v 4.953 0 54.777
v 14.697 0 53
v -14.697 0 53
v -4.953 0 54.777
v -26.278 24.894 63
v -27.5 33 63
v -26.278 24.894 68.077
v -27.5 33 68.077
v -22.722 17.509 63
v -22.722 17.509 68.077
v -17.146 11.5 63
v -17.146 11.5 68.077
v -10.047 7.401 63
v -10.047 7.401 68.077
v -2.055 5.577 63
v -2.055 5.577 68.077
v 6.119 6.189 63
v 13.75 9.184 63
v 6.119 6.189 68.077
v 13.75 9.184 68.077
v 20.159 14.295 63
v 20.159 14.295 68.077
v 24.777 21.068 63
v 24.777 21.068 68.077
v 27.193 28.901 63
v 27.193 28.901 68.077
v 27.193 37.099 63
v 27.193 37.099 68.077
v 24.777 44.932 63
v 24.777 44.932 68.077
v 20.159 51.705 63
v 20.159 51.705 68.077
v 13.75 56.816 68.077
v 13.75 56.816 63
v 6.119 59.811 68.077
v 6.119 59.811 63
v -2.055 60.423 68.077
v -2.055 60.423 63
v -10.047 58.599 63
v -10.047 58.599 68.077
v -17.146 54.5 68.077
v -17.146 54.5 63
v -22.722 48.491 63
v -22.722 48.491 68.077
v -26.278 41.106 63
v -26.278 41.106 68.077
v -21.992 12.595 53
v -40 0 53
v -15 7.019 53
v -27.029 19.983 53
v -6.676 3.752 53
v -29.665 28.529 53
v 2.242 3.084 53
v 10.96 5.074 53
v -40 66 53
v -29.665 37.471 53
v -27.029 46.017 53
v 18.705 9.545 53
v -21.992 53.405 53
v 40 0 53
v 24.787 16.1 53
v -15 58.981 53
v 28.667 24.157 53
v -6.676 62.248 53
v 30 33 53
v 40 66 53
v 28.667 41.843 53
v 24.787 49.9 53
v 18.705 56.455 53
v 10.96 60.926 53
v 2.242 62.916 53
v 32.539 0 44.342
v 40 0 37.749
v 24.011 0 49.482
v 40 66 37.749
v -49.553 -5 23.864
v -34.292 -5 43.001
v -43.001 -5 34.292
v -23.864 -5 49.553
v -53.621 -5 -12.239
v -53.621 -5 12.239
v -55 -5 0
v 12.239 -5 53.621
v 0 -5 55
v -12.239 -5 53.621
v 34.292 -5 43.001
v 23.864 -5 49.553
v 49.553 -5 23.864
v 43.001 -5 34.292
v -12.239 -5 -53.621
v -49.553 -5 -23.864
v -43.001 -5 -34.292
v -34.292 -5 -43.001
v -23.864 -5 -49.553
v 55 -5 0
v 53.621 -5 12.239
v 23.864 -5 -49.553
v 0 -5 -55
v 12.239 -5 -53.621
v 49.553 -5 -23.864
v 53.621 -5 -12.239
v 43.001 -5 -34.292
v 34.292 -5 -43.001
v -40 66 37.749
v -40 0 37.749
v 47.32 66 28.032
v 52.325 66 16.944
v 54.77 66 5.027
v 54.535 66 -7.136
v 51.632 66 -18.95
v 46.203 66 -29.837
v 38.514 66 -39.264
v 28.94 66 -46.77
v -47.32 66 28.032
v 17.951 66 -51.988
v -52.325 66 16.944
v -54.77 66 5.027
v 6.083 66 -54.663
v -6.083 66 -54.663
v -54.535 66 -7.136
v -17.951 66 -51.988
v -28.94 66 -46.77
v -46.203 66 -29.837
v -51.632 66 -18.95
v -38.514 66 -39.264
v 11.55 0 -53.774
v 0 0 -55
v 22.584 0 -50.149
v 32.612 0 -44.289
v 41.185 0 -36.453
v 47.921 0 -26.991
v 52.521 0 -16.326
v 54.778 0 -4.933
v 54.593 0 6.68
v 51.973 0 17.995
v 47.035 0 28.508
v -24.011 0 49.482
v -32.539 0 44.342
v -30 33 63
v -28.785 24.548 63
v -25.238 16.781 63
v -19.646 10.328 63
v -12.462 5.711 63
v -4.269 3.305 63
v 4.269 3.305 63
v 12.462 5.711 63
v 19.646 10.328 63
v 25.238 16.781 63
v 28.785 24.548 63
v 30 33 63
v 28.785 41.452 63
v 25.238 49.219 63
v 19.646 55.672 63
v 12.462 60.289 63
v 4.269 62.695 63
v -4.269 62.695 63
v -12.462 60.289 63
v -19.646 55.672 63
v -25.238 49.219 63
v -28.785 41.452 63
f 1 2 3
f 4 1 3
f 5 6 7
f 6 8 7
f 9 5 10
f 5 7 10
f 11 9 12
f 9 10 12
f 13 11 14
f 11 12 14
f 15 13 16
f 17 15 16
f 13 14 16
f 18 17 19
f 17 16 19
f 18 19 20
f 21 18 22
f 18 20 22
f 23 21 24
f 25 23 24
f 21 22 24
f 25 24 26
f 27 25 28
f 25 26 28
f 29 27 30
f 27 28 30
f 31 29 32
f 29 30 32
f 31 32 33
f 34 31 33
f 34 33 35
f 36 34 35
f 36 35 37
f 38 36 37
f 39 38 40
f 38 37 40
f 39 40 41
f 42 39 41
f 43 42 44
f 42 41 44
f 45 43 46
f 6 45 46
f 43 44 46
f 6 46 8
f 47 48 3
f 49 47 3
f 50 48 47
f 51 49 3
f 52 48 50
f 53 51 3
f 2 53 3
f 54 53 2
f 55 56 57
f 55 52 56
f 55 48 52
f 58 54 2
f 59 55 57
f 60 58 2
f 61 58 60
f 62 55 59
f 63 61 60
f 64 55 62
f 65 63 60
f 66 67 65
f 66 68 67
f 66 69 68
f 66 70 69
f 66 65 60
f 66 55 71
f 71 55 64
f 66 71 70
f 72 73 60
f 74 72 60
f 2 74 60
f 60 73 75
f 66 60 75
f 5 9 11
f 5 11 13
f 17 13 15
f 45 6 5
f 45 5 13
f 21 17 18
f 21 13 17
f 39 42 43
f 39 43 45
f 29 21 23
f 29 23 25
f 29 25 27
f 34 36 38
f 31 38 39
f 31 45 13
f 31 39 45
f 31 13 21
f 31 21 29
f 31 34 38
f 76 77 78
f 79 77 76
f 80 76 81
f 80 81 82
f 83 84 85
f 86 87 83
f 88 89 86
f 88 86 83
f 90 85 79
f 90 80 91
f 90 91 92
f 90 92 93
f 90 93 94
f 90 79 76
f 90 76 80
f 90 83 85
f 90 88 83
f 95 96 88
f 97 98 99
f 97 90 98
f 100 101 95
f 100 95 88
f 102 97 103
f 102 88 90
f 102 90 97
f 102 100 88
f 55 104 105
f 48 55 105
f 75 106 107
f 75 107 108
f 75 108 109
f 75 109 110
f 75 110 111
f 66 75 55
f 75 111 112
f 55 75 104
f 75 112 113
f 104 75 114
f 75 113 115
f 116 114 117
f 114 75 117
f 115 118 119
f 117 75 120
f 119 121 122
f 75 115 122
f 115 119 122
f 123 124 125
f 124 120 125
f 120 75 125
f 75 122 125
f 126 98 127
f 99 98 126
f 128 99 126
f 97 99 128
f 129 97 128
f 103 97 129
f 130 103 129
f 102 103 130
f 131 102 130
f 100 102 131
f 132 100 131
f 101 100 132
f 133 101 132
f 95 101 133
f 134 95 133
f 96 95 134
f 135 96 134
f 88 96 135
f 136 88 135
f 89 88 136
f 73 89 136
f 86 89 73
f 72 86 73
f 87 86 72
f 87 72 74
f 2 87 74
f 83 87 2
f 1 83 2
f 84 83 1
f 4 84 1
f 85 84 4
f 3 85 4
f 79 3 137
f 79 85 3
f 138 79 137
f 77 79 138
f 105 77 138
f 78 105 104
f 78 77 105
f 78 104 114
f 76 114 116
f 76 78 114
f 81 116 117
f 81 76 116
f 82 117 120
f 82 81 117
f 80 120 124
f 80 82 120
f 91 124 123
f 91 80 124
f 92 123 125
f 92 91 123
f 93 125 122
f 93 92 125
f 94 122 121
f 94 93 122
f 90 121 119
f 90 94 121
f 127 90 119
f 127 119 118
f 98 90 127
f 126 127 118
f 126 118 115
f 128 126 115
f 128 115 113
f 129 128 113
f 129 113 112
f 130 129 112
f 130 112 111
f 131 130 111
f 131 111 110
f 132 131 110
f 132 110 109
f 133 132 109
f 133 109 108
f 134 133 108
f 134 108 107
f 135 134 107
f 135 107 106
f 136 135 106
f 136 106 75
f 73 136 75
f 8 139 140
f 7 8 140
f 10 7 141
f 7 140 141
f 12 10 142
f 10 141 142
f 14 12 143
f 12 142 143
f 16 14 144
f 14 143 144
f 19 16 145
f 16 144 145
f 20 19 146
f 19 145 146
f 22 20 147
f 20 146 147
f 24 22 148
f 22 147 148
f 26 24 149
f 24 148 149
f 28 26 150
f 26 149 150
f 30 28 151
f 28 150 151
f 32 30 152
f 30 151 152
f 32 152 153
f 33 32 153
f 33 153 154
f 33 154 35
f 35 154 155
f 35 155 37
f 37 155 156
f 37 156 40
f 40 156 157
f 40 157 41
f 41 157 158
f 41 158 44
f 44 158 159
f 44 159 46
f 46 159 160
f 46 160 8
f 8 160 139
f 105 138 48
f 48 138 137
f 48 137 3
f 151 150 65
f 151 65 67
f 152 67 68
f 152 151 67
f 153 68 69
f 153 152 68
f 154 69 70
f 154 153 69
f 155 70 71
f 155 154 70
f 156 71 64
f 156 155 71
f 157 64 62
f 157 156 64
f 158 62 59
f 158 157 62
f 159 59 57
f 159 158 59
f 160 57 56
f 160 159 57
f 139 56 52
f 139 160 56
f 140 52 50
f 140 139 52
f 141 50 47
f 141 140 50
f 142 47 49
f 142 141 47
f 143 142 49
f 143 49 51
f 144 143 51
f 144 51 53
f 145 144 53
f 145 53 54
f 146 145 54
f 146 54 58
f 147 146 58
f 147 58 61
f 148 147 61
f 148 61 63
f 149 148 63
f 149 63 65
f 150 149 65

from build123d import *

# Parameters (mm, degrees)
SKETCH1_R           = 55
BOSS_EXTRUDE1_DEPTH = 66
BOSS_EXTRUDE3_DEPTH = 63
SKETCH5_R           = 56.242985336
SKETCH5_R_2         = 30
CUT_EXTRUDE2_DEPTH  = 10
BOSS_EXTRUDE4_START = 5
SKETCH6_R           = 55
BOSS_EXTRUDE4_DEPTH = 5


with BuildPart() as part:
    # Sketch1 → Boss-Extrude1 (new body)
    with BuildSketch(Plane(origin=(0, 0, 0), x_dir=(1, 0, 0), z_dir=(0, 1, 0))):
        with Locations(Location((0, 0, 0), (0, 0, 270))):
            Circle(SKETCH1_R)
    extrude(amount=BOSS_EXTRUDE1_DEPTH)

    # Sketch2 → Boss-Extrude3 (add)
    with BuildSketch(Plane.XY):
        Polygon((-40, 66), (-40, 0), (0, 0), (40, 0), (40, 66), align=None)
    extrude(amount=BOSS_EXTRUDE3_DEPTH)

    # Sketch4 → Revolve1 (revolve)
    with BuildSketch(Plane(origin=(0, 0, 0), x_dir=(0, 0, -1), z_dir=(1, 0, 0)), mode=Mode.PRIVATE) as revolve1_sk:
        Polygon((-63, 5.5), (-68.077040766, 5.5), (-63, 3), align=None)
    revolve(revolve1_sk.sketch.rotate(Axis((0, 33, 63), (0, 0, 1)), 270), axis=Axis((0, 33, 63), (0, 0, 1)))

    # Sketch5 → Cut-Extrude2 (cut)
    with BuildSketch(Plane.XY.offset(63)):
        with Locations((0, 33)):
            Circle(SKETCH5_R)
        with Locations((0, 33)):
            Circle(SKETCH5_R_2, mode=Mode.SUBTRACT)
    extrude(amount=-CUT_EXTRUDE2_DEPTH, mode=Mode.SUBTRACT)

    # Sketch6 → Boss-Extrude4 (add)
    with BuildSketch(Plane(origin=(0, 0, 0), x_dir=(-1, 0, 0), z_dir=(0, -1, 0)).offset(BOSS_EXTRUDE4_START)):
        with Locations(Location((0, 0, 0), (0, 0, 90))):
            Circle(SKETCH6_R)
    extrude(amount=-BOSS_EXTRUDE4_DEPTH)


solid = part.part
